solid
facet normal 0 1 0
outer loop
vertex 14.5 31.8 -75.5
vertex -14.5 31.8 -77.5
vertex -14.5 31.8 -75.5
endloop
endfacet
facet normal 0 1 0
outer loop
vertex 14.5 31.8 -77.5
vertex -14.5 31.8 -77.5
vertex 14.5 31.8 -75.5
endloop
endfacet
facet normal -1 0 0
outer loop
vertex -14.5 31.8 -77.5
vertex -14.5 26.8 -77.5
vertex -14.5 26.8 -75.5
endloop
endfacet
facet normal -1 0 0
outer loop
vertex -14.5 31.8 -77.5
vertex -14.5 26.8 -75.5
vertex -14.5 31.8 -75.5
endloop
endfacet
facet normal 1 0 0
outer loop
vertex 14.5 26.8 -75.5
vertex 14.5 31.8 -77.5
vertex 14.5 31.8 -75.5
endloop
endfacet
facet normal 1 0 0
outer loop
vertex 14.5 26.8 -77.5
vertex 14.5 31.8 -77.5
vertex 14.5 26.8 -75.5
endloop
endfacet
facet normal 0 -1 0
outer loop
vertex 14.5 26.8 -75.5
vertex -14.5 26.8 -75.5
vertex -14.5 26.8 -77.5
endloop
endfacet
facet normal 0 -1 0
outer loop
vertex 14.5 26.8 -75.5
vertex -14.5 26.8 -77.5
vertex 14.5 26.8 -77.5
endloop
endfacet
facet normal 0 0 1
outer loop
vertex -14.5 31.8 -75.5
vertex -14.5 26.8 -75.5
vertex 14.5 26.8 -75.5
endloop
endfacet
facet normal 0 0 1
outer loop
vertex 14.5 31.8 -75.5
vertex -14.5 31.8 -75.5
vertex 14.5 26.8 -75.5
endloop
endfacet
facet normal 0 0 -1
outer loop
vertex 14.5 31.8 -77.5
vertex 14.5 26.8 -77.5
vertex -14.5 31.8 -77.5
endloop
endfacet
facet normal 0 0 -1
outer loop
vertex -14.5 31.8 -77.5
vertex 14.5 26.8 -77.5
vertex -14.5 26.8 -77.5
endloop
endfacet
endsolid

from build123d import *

# Parameters (mm, degrees)
SKETCH1_W                       = 39
SKETCH1_H                       = 155
BOSS_EXTRUDE1_DEPTH             = 2
BOSS_EXTRUDE2_DEPTH             = 38
SKETCH3_W                       = 2
SKETCH3_H                       = 2
BOSS_EXTRUDE3_DEPTH             = 38
SKETCH4_W                       = 2
SKETCH4_H                       = 2
BOSS_EXTRUDE4_DEPTH             = 151
SKETCH6_W                       = 35
SKETCH6_H                       = 2.2
CUT_EXTRUDE1_DEPTH              = 160.340045186
SKETCH7_W                       = 35
SKETCH7_H                       = 2.2
CUT_EXTRUDE2_DEPTH              = 89.490112442
SKETCH5_W                       = 31
SKETCH5_H                       = 2
BOSS_EXTRUDE5_DEPTH             = 2
BOSS_EXTRUDE6_REACH             = 91.367
SKETCH8_W                       = 2
SKETCH8_H                       = 2
BOSS_EXTRUDE6_DIRECTION_2_REACH = 91.367
SKETCH10_W                      = 2
SKETCH10_H                      = 2.2
SKETCH10_W_2                    = 2.2
SKETCH10_H_2                    = 2
BOSS_EXTRUDE8_DEPTH             = 2
SKETCH11_W                      = 2
SKETCH11_H                      = 2.2
SKETCH11_W_2                    = 2.2
SKETCH11_H_2                    = 2
BOSS_EXTRUDE9_DEPTH             = 2
FILLET2_R                       = 2.5
SKETCH14_W                      = 36.5
SKETCH14_H                      = 7.75
BOSS_EXTRUDE10_DEPTH            = 2
SKETCH13_W                      = 31
SKETCH13_H                      = 3
CUT_EXTRUDE4_DEPTH              = 2
FILLET3_R                       = 2
FILLET4_R                       = 0.5
SKETCH15_R                      = 5.1
CUT_EXTRUDE5_DEPTH              = 90.367219941
SKETCH16_R                      = 7.1
BOSS_EXTRUDE11_DEPTH            = 1
FILLET5_R                       = 0.5
FILLET7_R                       = 0.5
CUT_EXTRUDE6_DEPTH              = 6
SKETCH18_W                      = 29
SKETCH18_H                      = 3
CUT_EXTRUDE8_DEPTH              = 90.367219986
CUT_EXTRUDE11_DEPTH             = 90.367219986
CUT_EXTRUDE11_DEPTH_BACK        = 90.367219986
SKETCH20_W                      = 5
SKETCH20_H                      = 40
CUT_EXTRUDE12_DEPTH             = 43.594013664
CUT_EXTRUDE12_DEPTH_BACK        = 43.594013664
SKETCH21_W                      = 29
SKETCH21_H                      = 8.2
SKETCH22_W                      = 29
SKETCH22_H                      = 17.8
CUT_EXTRUDE13_DEPTH             = 36.0069993


with BuildPart() as part:
    # Sketch1 → Boss-Extrude1 (new body)
    with BuildSketch(Plane(origin=(0, 0, 0), x_dir=(1, 0, 0), z_dir=(0, 1, 0))):
        Rectangle(SKETCH1_W, SKETCH1_H)
    extrude(amount=BOSS_EXTRUDE1_DEPTH)

    # Sketch2 → Boss-Extrude2 (add)
    with BuildSketch(Plane(origin=(0, 2, 0), x_dir=(1, 0, 0), z_dir=(0, 1, 0))):
        Polygon((-17.5, -77.5), (-17.5, -75.5), (-17.5, 75.5), (17.5, 75.5), (17.5, -75.5), (17.5, -77.5), (19.5, -77.5), (19.5, 77.5), (-19.5, 77.5), (-19.5, -77.5), align=None)
    extrude(amount=BOSS_EXTRUDE2_DEPTH)

    # Sketch3 → Boss-Extrude3 (add)
    with BuildSketch(Plane(origin=(0, 2, 0), x_dir=(1, 0, 0), z_dir=(0, 1, 0))):
        with Locations((-16.5, -76.5)):
            Rectangle(SKETCH3_W, SKETCH3_H)
        with Locations((-16.5, -72.3)):
            Rectangle(SKETCH3_W, SKETCH3_H)
        with Locations((16.5, -76.5)):
            Rectangle(SKETCH3_W, SKETCH3_H)
        with Locations((16.5, -72.3)):
            Rectangle(SKETCH3_W, SKETCH3_H)
    extrude(amount=BOSS_EXTRUDE3_DEPTH)

    # Sketch4 → Boss-Extrude4 (add)
    with BuildSketch(Plane.XY.offset(-75.5)):
        with Locations((-16.5, 39)):
            Rectangle(SKETCH4_W, SKETCH4_H)
        Polygon((-15.5, 33.8), (-17.5, 31.8), (-17.5, 35.8), (-15.5, 35.8), align=None)
        Polygon((15.5, 35.8), (17.5, 35.8), (17.5, 31.8), (15.5, 33.8), align=None)
        with Locations((16.5, 39)):
            Rectangle(SKETCH4_W, SKETCH4_H)
    extrude(amount=BOSS_EXTRUDE4_DEPTH)

    # Sketch6 → Cut-Extrude1 (cut, through all)
    with BuildSketch(Plane.XY.offset(-75.5)):
        with Locations((0, 36.9)):
            Rectangle(SKETCH6_W, SKETCH6_H)
    extrude(amount=CUT_EXTRUDE1_DEPTH, mode=Mode.SUBTRACT)

    # Sketch7 → Cut-Extrude2 (cut, through all)
    with BuildSketch(Plane(origin=(0, 2, 0), x_dir=(1, 0, 0), z_dir=(0, 1, 0))):
        with Locations((0, -74.4)):
            Rectangle(SKETCH7_W, SKETCH7_H)
    extrude(amount=CUT_EXTRUDE2_DEPTH, mode=Mode.SUBTRACT)

    # Sketch5 → Boss-Extrude5 (add)
    with BuildSketch(Plane(origin=(0, 2, 0), x_dir=(1, 0, 0), z_dir=(0, 1, 0))):
        with Locations((0, -76.5)):
            Rectangle(SKETCH5_W, SKETCH5_H)
        with Locations((0, -72.3)):
            Rectangle(SKETCH5_W, SKETCH5_H)
    extrude(amount=BOSS_EXTRUDE5_DEPTH)

    # Boss-Extrude6: up to this face of the body (flat: up to its plane)
    boss_extrude6_end = Plane(part.part.faces().sort_by_distance((17.5, 16.9, -2.1))[0])
    # Sketch8 → Boss-Extrude6 (add, up to the picked face)
    with BuildSketch(Plane(origin=(0, 0, 0), x_dir=(0, 0, -1), z_dir=(1, 0, 0)), mode=Mode.PRIVATE) as boss_extrude6_sk1:
        with Locations((74.5, 39)):
            Rectangle(SKETCH8_W, SKETCH8_H)
    boss_extrude6_tool1 = split(extrude(boss_extrude6_sk1.sketch, amount=BOSS_EXTRUDE6_REACH, mode=Mode.PRIVATE), bisect_by=boss_extrude6_end, keep=Keep.BOTH, mode=Mode.PRIVATE)
    # Sketch8 → Boss-Extrude6 (add, up to the picked face)
    with BuildSketch(Plane(origin=(0, 0, 0), x_dir=(0, 0, -1), z_dir=(1, 0, 0)), mode=Mode.PRIVATE) as boss_extrude6_sk2:
        Polygon((75.5, 35.8), (73.5, 35.8), (73.5, 33.8), (75.5, 31.8), align=None)
    boss_extrude6_tool2 = split(extrude(boss_extrude6_sk2.sketch, amount=BOSS_EXTRUDE6_REACH, mode=Mode.PRIVATE), bisect_by=boss_extrude6_end, keep=Keep.BOTH, mode=Mode.PRIVATE)
    add(boss_extrude6_tool1.solids().sort_by(Axis((0, 39, -74.5), (1, 0, 0)))[0])
    add(boss_extrude6_tool2.solids().sort_by(Axis((0, 34.244444, -74.611111), (1, 0, 0)))[0])

    # Boss-Extrude6 direction 2: up to this face of the body (flat: up to its plane)
    boss_extrude6_direction_2_end = Plane(part.part.faces().sort_by_distance((-17.5, 16.9, -2.1))[0])
    # Sketch8 → Boss-Extrude6 direction 2 (add, up to the picked face)
    with BuildSketch(Plane(origin=(0, 0, 0), x_dir=(0, 0, -1), z_dir=(1, 0, 0)), mode=Mode.PRIVATE) as boss_extrude6_direction_2_sk1:
        with Locations((74.5, 39)):
            Rectangle(SKETCH8_W, SKETCH8_H)
    boss_extrude6_direction_2_tool1 = split(extrude(boss_extrude6_direction_2_sk1.sketch, amount=-BOSS_EXTRUDE6_DIRECTION_2_REACH, mode=Mode.PRIVATE), bisect_by=boss_extrude6_direction_2_end, keep=Keep.BOTH, mode=Mode.PRIVATE)
    # Sketch8 → Boss-Extrude6 direction 2 (add, up to the picked face)
    with BuildSketch(Plane(origin=(0, 0, 0), x_dir=(0, 0, -1), z_dir=(1, 0, 0)), mode=Mode.PRIVATE) as boss_extrude6_direction_2_sk2:
        Polygon((75.5, 35.8), (73.5, 35.8), (73.5, 33.8), (75.5, 31.8), align=None)
    boss_extrude6_direction_2_tool2 = split(extrude(boss_extrude6_direction_2_sk2.sketch, amount=-BOSS_EXTRUDE6_DIRECTION_2_REACH, mode=Mode.PRIVATE), bisect_by=boss_extrude6_direction_2_end, keep=Keep.BOTH, mode=Mode.PRIVATE)
    add(boss_extrude6_direction_2_tool1.solids().sort_by(Axis((0, 39, -74.5), (-1, 0, 0)))[0])
    add(boss_extrude6_direction_2_tool2.solids().sort_by(Axis((0, 34.244444, -74.611111), (-1, 0, 0)))[0])

    # Sketch10 → Boss-Extrude8 (add)
    with BuildSketch(Plane(origin=(-17.5, 0, 0), x_dir=(0, 0, -1), z_dir=(1, 0, 0))):
        with Locations((-76.5, 36.9)):
            Rectangle(SKETCH10_W, SKETCH10_H)
        with Locations((-74.4, 39)):
            Rectangle(SKETCH10_W_2, SKETCH10_H_2)
    extrude(amount=BOSS_EXTRUDE8_DEPTH)

    # Sketch11 → Boss-Extrude9 (add)
    with BuildSketch(Plane.ZY.offset(-17.5)):
        with Locations((76.5, 36.9)):
            Rectangle(SKETCH11_W, SKETCH11_H)
        with Locations((74.4, 39)):
            Rectangle(SKETCH11_W_2, SKETCH11_H_2)
    extrude(amount=BOSS_EXTRUDE9_DEPTH)

    # Fillet2
    fillet2_edges = [part.edges().sort_by_distance(p)[0] for p in [
        (-17.5, 16.9, 71.3),
        (17.5, 16.9, 71.3),
        (19.5, 20, 77.5),
        (-19.5, 20, 77.5),
        (-19.5, 20, -77.5),
        (-17.5, 16.9, -75.5),
        (17.5, 16.9, -75.5),
        (19.5, 20, -77.5),
        (19.5, 40, 0),
        (-19.5, 40, 0),
        (19.5, 0, 0),
        (-19.5, 0, 0),
        (0, 40, -77.5),
        (0, 0, 77.5),
        (0, 0, -77.5),
        (-17.5, 40, 77.5),
        (17.5, 40, 77.5),
    ]]
    fillet(fillet2_edges, radius=FILLET2_R)

    # Sketch14 → Boss-Extrude10 (add)
    with BuildSketch(Plane.XY.offset(-75.5)):
        with Locations((0, 5.125)):
            Rectangle(SKETCH14_W, SKETCH14_H)
    extrude(amount=BOSS_EXTRUDE10_DEPTH)

    # Sketch13 → Cut-Extrude4 (cut)
    with BuildSketch(Plane(origin=(0, 0, -77.5), x_dir=(-1, 0, 0), z_dir=(0, 0, -1))):
        with Locations((0, 5.5)):
            Rectangle(SKETCH13_W, SKETCH13_H)
    extrude(amount=-CUT_EXTRUDE4_DEPTH, mode=Mode.SUBTRACT)

    # Fillet3
    fillet3_edges = [part.edges().sort_by_distance(p)[0] for p in [
        (0, 9, -73.5),
    ]]
    fillet(fillet3_edges, radius=FILLET3_R - 0.0001)  # a hair under: the kernel refuses the full size

    # Fillet4
    fillet4_edges = [part.edges().sort_by_distance(p)[0] for p in [
        (15.5, 5.5, -75.5),
        (15.5, 4, -76.5),
        (0, 7, -75.5),
        (15.5, 7, -76.5),
        (-15.5, 5.5, -75.5),
        (-15.5, 7, -76.5),
        (0, 4, -75.5),
        (-15.5, 4, -76.5),
        (15.5, 5.5, -77.5),
        (0, 4, -77.5),
        (-15.5, 5.5, -77.5),
        (0, 7, -77.5),
    ]]
    fillet(fillet4_edges, radius=FILLET4_R)

    # Sketch15 → Cut-Extrude5 (cut, through all)
    with BuildSketch(Plane.XZ):
        with Locations(Location((0, 38.75, 0), (0, 0, 270))):
            Circle(SKETCH15_R)
        with Locations(Location((0, -38.75, 0), (0, 0, 270))):
            Circle(SKETCH15_R)
    extrude(amount=-CUT_EXTRUDE5_DEPTH, mode=Mode.SUBTRACT)

    # Sketch16 → Boss-Extrude11 (add)
    with BuildSketch(Plane(origin=(0, 2, 0), x_dir=(1, 0, 0), z_dir=(0, 1, 0))):
        with Locations(Location((0, 38.75, 0), (0, 0, 270))):
            Circle(SKETCH16_R)
        with Locations(Location((0, -38.75, 0), (0, 0, 270))):
            Circle(SKETCH16_R)
    extrude(amount=BOSS_EXTRUDE11_DEPTH)

    # Fillet5
    fillet5_edges = [part.edges().sort_by_distance(p)[0] for p in [
        (0, 2, -45.85),
        (0, 3, -45.85),
        (0, 2, 31.65),
        (0, 3, 31.65),
    ]]
    fillet(fillet5_edges, radius=FILLET5_R - 0.0001)  # a hair under: the kernel refuses the full size

    # Fillet7
    fillet7_edges = [part.edges().sort_by_distance(p)[0] for p in [
        (15.5, 40, 0.75),
        (0, 4, 77.5),
        (0, 40, -73.5),
        (-15.5, 40, 0.75),
        (-15.5, 20.75, 77.5),
        (-15.5, 39.267766953, 76.767766953),
        (15.5, 20.75, 77.5),
        (15.5, 39.267766953, 76.767766953),
    ]]
    fillet(fillet7_edges, radius=FILLET7_R)

    # Sketch17 → Cut-Extrude6 (cut)
    with BuildSketch(Plane.XZ):
        Polygon((-17, -77.5), (-17, 70.299999999), (-14.999999999, 71.3), (-14.999999999, 77.5), (14.999999999, 77.5), (14.999999999, 71.3), (17, 70.299999999), (17, -77.5), align=None)
    extrude(amount=-CUT_EXTRUDE6_DEPTH, mode=Mode.SUBTRACT)

    # Sketch18 → Cut-Extrude8 (cut, through all)
    with BuildSketch(Plane.XY):
        with Locations((0, 7.5)):
            Rectangle(SKETCH18_W, SKETCH18_H)
    extrude(amount=-CUT_EXTRUDE8_DEPTH, mode=Mode.SUBTRACT)

    # Sketch20 → Cut-Extrude11 (cut, two sides: drawn at the far end of the back side and taken through both)
    with BuildSketch(Plane.XY.offset(-CUT_EXTRUDE11_DEPTH_BACK)):
        Polygon((19.5, 40), (14.5, 40), (14.5, 6), (14.5, 0), (19.5, 0), align=None)
        with Locations((-17, 20)):
            Rectangle(SKETCH20_W, SKETCH20_H)
    extrude(amount=CUT_EXTRUDE11_DEPTH + CUT_EXTRUDE11_DEPTH_BACK, mode=Mode.SUBTRACT)

    # Sketch21 → Cut-Extrude12 (cut, two sides: drawn at the far end of the back side and taken through both)
    with BuildSketch(Plane.XY.offset(-75.5).offset(-CUT_EXTRUDE12_DEPTH_BACK)):
        with Locations((0, 35.9)):
            Rectangle(SKETCH21_W, SKETCH21_H)
    extrude(amount=CUT_EXTRUDE12_DEPTH + CUT_EXTRUDE12_DEPTH_BACK, mode=Mode.SUBTRACT)

    # Sketch22 → Cut-Extrude13 (cut, through all)
    with BuildSketch(Plane.XY.offset(-75.5)):
        with Locations((0, 17.9)):
            Rectangle(SKETCH22_W, SKETCH22_H)
    extrude(amount=-CUT_EXTRUDE13_DEPTH, mode=Mode.SUBTRACT)


solid = part.part
